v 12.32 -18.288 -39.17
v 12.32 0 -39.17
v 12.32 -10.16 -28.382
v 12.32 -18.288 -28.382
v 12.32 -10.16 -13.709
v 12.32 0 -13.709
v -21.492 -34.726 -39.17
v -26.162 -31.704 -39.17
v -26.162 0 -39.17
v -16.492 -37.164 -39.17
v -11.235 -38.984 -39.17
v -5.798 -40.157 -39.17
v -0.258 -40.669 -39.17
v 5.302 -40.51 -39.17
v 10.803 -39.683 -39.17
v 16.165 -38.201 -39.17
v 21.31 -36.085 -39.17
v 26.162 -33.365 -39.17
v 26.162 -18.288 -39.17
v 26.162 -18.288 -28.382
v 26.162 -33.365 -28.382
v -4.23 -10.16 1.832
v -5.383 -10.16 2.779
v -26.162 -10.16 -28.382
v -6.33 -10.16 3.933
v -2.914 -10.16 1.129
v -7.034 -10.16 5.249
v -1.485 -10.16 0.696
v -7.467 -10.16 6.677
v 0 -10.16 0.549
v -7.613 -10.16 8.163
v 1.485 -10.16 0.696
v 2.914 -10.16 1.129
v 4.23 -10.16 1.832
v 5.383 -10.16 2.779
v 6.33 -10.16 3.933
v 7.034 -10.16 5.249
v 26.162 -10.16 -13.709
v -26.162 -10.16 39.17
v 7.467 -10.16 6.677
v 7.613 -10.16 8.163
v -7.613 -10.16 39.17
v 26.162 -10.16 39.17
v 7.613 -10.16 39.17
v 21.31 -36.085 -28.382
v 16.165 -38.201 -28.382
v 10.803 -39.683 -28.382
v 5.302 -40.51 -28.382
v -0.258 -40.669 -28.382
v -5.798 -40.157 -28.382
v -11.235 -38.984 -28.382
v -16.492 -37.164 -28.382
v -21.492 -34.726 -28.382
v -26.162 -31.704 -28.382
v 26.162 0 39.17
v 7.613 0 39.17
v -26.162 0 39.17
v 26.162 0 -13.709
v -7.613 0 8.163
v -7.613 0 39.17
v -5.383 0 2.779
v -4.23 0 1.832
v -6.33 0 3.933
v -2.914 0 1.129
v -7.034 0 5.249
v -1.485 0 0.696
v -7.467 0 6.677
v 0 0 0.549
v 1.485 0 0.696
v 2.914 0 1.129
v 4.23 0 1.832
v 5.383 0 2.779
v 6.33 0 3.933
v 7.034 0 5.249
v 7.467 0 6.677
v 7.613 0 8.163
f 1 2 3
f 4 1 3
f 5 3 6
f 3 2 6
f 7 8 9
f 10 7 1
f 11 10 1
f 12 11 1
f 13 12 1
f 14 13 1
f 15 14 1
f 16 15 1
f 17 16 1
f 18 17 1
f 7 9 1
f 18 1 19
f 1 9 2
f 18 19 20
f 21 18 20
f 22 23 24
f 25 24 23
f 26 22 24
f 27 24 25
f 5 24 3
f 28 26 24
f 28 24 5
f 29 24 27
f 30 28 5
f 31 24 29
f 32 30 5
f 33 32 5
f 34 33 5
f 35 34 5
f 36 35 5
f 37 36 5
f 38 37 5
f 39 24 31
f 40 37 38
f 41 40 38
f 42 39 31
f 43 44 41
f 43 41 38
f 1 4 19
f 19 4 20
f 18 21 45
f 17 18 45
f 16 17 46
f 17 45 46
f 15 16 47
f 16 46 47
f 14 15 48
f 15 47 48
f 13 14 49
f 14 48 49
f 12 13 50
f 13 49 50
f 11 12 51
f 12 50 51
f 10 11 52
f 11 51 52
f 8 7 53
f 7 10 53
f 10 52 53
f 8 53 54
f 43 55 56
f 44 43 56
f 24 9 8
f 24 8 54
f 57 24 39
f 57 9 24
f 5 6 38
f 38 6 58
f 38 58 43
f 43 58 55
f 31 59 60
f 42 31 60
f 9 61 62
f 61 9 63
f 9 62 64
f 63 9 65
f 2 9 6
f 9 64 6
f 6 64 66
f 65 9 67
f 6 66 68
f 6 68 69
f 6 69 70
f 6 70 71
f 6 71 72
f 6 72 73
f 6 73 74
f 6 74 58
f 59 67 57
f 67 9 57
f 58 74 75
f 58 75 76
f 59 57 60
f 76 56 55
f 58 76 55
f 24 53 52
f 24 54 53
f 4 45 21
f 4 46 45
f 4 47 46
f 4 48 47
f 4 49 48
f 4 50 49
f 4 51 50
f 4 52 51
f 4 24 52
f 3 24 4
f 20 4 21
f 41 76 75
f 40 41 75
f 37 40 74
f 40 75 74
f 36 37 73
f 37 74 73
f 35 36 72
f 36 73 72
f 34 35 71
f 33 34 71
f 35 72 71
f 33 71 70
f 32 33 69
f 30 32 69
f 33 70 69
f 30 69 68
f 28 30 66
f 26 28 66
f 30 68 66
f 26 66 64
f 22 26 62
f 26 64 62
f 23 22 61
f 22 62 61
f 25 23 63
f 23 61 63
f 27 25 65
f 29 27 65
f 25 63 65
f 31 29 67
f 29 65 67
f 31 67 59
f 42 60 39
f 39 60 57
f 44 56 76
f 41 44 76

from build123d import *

# Parameters (mm, degrees)
F1_DEPTH = 10.16
F0_W     = 52.324884
F0_H     = 10.78823
F2_DEPTH = 45.212
F4_DEPTH = 25.4
F5_W     = 14.396261
F5_H     = 25.470311
F6_DEPTH = 18.288


with BuildPart() as f1:
    # F0 (on Front) → F1 (new body)
    with BuildSketch(Plane.XZ):
        with BuildLine():
            Line((26.162442, -28.381733), (26.162442, 39.169963))
            Line((26.162442, 39.169963), (7.613408, 39.169963))
            Line((7.613408, 39.169963), (7.613408, 8.162629))
            ThreePointArc((7.613408, 8.162629), (0, 0.54922), (-7.613408, 8.162629))
            Line((-7.613408, 8.162629), (-7.613408, 39.169963))
            Line((-7.613408, 39.169963), (-26.162442, 39.169963))
            Line((-26.162442, 39.169963), (-26.162442, -28.381733))
            Line((-26.162442, -28.381733), (26.162442, -28.381733))
        make_face()
    extrude(amount=F1_DEPTH)

    # F0 (on Front) → F2 (join)
    with BuildSketch(Plane.XZ):
        with Locations((0, -33.775848)):
            Rectangle(F0_W, F0_H)
    extrude(amount=F2_DEPTH)

    # F3 (on face) → F4 (cut)
    with BuildSketch(Plane.XY.offset(-28.381733)):
        with BuildLine():
            ThreePointArc((26.162442, -33.365056), (-0.258226, -40.668626), (-26.162442, -31.703949))
            Line((-26.162442, -31.703949), (-26.162442, -45.212))
            Line((-26.162442, -45.212), (26.162442, -45.212))
            Line((26.162442, -45.212), (26.162442, -33.365056))
        make_face()
    extrude(amount=-F4_DEPTH, mode=Mode.SUBTRACT)

    # F5 (on face) → F6 (cut)
    with BuildSketch(Plane.XZ):
        with Locations((19.51801, -26.443774)):
            Rectangle(F5_W, F5_H)
    extrude(amount=F6_DEPTH, mode=Mode.SUBTRACT)


solid = f1.part
